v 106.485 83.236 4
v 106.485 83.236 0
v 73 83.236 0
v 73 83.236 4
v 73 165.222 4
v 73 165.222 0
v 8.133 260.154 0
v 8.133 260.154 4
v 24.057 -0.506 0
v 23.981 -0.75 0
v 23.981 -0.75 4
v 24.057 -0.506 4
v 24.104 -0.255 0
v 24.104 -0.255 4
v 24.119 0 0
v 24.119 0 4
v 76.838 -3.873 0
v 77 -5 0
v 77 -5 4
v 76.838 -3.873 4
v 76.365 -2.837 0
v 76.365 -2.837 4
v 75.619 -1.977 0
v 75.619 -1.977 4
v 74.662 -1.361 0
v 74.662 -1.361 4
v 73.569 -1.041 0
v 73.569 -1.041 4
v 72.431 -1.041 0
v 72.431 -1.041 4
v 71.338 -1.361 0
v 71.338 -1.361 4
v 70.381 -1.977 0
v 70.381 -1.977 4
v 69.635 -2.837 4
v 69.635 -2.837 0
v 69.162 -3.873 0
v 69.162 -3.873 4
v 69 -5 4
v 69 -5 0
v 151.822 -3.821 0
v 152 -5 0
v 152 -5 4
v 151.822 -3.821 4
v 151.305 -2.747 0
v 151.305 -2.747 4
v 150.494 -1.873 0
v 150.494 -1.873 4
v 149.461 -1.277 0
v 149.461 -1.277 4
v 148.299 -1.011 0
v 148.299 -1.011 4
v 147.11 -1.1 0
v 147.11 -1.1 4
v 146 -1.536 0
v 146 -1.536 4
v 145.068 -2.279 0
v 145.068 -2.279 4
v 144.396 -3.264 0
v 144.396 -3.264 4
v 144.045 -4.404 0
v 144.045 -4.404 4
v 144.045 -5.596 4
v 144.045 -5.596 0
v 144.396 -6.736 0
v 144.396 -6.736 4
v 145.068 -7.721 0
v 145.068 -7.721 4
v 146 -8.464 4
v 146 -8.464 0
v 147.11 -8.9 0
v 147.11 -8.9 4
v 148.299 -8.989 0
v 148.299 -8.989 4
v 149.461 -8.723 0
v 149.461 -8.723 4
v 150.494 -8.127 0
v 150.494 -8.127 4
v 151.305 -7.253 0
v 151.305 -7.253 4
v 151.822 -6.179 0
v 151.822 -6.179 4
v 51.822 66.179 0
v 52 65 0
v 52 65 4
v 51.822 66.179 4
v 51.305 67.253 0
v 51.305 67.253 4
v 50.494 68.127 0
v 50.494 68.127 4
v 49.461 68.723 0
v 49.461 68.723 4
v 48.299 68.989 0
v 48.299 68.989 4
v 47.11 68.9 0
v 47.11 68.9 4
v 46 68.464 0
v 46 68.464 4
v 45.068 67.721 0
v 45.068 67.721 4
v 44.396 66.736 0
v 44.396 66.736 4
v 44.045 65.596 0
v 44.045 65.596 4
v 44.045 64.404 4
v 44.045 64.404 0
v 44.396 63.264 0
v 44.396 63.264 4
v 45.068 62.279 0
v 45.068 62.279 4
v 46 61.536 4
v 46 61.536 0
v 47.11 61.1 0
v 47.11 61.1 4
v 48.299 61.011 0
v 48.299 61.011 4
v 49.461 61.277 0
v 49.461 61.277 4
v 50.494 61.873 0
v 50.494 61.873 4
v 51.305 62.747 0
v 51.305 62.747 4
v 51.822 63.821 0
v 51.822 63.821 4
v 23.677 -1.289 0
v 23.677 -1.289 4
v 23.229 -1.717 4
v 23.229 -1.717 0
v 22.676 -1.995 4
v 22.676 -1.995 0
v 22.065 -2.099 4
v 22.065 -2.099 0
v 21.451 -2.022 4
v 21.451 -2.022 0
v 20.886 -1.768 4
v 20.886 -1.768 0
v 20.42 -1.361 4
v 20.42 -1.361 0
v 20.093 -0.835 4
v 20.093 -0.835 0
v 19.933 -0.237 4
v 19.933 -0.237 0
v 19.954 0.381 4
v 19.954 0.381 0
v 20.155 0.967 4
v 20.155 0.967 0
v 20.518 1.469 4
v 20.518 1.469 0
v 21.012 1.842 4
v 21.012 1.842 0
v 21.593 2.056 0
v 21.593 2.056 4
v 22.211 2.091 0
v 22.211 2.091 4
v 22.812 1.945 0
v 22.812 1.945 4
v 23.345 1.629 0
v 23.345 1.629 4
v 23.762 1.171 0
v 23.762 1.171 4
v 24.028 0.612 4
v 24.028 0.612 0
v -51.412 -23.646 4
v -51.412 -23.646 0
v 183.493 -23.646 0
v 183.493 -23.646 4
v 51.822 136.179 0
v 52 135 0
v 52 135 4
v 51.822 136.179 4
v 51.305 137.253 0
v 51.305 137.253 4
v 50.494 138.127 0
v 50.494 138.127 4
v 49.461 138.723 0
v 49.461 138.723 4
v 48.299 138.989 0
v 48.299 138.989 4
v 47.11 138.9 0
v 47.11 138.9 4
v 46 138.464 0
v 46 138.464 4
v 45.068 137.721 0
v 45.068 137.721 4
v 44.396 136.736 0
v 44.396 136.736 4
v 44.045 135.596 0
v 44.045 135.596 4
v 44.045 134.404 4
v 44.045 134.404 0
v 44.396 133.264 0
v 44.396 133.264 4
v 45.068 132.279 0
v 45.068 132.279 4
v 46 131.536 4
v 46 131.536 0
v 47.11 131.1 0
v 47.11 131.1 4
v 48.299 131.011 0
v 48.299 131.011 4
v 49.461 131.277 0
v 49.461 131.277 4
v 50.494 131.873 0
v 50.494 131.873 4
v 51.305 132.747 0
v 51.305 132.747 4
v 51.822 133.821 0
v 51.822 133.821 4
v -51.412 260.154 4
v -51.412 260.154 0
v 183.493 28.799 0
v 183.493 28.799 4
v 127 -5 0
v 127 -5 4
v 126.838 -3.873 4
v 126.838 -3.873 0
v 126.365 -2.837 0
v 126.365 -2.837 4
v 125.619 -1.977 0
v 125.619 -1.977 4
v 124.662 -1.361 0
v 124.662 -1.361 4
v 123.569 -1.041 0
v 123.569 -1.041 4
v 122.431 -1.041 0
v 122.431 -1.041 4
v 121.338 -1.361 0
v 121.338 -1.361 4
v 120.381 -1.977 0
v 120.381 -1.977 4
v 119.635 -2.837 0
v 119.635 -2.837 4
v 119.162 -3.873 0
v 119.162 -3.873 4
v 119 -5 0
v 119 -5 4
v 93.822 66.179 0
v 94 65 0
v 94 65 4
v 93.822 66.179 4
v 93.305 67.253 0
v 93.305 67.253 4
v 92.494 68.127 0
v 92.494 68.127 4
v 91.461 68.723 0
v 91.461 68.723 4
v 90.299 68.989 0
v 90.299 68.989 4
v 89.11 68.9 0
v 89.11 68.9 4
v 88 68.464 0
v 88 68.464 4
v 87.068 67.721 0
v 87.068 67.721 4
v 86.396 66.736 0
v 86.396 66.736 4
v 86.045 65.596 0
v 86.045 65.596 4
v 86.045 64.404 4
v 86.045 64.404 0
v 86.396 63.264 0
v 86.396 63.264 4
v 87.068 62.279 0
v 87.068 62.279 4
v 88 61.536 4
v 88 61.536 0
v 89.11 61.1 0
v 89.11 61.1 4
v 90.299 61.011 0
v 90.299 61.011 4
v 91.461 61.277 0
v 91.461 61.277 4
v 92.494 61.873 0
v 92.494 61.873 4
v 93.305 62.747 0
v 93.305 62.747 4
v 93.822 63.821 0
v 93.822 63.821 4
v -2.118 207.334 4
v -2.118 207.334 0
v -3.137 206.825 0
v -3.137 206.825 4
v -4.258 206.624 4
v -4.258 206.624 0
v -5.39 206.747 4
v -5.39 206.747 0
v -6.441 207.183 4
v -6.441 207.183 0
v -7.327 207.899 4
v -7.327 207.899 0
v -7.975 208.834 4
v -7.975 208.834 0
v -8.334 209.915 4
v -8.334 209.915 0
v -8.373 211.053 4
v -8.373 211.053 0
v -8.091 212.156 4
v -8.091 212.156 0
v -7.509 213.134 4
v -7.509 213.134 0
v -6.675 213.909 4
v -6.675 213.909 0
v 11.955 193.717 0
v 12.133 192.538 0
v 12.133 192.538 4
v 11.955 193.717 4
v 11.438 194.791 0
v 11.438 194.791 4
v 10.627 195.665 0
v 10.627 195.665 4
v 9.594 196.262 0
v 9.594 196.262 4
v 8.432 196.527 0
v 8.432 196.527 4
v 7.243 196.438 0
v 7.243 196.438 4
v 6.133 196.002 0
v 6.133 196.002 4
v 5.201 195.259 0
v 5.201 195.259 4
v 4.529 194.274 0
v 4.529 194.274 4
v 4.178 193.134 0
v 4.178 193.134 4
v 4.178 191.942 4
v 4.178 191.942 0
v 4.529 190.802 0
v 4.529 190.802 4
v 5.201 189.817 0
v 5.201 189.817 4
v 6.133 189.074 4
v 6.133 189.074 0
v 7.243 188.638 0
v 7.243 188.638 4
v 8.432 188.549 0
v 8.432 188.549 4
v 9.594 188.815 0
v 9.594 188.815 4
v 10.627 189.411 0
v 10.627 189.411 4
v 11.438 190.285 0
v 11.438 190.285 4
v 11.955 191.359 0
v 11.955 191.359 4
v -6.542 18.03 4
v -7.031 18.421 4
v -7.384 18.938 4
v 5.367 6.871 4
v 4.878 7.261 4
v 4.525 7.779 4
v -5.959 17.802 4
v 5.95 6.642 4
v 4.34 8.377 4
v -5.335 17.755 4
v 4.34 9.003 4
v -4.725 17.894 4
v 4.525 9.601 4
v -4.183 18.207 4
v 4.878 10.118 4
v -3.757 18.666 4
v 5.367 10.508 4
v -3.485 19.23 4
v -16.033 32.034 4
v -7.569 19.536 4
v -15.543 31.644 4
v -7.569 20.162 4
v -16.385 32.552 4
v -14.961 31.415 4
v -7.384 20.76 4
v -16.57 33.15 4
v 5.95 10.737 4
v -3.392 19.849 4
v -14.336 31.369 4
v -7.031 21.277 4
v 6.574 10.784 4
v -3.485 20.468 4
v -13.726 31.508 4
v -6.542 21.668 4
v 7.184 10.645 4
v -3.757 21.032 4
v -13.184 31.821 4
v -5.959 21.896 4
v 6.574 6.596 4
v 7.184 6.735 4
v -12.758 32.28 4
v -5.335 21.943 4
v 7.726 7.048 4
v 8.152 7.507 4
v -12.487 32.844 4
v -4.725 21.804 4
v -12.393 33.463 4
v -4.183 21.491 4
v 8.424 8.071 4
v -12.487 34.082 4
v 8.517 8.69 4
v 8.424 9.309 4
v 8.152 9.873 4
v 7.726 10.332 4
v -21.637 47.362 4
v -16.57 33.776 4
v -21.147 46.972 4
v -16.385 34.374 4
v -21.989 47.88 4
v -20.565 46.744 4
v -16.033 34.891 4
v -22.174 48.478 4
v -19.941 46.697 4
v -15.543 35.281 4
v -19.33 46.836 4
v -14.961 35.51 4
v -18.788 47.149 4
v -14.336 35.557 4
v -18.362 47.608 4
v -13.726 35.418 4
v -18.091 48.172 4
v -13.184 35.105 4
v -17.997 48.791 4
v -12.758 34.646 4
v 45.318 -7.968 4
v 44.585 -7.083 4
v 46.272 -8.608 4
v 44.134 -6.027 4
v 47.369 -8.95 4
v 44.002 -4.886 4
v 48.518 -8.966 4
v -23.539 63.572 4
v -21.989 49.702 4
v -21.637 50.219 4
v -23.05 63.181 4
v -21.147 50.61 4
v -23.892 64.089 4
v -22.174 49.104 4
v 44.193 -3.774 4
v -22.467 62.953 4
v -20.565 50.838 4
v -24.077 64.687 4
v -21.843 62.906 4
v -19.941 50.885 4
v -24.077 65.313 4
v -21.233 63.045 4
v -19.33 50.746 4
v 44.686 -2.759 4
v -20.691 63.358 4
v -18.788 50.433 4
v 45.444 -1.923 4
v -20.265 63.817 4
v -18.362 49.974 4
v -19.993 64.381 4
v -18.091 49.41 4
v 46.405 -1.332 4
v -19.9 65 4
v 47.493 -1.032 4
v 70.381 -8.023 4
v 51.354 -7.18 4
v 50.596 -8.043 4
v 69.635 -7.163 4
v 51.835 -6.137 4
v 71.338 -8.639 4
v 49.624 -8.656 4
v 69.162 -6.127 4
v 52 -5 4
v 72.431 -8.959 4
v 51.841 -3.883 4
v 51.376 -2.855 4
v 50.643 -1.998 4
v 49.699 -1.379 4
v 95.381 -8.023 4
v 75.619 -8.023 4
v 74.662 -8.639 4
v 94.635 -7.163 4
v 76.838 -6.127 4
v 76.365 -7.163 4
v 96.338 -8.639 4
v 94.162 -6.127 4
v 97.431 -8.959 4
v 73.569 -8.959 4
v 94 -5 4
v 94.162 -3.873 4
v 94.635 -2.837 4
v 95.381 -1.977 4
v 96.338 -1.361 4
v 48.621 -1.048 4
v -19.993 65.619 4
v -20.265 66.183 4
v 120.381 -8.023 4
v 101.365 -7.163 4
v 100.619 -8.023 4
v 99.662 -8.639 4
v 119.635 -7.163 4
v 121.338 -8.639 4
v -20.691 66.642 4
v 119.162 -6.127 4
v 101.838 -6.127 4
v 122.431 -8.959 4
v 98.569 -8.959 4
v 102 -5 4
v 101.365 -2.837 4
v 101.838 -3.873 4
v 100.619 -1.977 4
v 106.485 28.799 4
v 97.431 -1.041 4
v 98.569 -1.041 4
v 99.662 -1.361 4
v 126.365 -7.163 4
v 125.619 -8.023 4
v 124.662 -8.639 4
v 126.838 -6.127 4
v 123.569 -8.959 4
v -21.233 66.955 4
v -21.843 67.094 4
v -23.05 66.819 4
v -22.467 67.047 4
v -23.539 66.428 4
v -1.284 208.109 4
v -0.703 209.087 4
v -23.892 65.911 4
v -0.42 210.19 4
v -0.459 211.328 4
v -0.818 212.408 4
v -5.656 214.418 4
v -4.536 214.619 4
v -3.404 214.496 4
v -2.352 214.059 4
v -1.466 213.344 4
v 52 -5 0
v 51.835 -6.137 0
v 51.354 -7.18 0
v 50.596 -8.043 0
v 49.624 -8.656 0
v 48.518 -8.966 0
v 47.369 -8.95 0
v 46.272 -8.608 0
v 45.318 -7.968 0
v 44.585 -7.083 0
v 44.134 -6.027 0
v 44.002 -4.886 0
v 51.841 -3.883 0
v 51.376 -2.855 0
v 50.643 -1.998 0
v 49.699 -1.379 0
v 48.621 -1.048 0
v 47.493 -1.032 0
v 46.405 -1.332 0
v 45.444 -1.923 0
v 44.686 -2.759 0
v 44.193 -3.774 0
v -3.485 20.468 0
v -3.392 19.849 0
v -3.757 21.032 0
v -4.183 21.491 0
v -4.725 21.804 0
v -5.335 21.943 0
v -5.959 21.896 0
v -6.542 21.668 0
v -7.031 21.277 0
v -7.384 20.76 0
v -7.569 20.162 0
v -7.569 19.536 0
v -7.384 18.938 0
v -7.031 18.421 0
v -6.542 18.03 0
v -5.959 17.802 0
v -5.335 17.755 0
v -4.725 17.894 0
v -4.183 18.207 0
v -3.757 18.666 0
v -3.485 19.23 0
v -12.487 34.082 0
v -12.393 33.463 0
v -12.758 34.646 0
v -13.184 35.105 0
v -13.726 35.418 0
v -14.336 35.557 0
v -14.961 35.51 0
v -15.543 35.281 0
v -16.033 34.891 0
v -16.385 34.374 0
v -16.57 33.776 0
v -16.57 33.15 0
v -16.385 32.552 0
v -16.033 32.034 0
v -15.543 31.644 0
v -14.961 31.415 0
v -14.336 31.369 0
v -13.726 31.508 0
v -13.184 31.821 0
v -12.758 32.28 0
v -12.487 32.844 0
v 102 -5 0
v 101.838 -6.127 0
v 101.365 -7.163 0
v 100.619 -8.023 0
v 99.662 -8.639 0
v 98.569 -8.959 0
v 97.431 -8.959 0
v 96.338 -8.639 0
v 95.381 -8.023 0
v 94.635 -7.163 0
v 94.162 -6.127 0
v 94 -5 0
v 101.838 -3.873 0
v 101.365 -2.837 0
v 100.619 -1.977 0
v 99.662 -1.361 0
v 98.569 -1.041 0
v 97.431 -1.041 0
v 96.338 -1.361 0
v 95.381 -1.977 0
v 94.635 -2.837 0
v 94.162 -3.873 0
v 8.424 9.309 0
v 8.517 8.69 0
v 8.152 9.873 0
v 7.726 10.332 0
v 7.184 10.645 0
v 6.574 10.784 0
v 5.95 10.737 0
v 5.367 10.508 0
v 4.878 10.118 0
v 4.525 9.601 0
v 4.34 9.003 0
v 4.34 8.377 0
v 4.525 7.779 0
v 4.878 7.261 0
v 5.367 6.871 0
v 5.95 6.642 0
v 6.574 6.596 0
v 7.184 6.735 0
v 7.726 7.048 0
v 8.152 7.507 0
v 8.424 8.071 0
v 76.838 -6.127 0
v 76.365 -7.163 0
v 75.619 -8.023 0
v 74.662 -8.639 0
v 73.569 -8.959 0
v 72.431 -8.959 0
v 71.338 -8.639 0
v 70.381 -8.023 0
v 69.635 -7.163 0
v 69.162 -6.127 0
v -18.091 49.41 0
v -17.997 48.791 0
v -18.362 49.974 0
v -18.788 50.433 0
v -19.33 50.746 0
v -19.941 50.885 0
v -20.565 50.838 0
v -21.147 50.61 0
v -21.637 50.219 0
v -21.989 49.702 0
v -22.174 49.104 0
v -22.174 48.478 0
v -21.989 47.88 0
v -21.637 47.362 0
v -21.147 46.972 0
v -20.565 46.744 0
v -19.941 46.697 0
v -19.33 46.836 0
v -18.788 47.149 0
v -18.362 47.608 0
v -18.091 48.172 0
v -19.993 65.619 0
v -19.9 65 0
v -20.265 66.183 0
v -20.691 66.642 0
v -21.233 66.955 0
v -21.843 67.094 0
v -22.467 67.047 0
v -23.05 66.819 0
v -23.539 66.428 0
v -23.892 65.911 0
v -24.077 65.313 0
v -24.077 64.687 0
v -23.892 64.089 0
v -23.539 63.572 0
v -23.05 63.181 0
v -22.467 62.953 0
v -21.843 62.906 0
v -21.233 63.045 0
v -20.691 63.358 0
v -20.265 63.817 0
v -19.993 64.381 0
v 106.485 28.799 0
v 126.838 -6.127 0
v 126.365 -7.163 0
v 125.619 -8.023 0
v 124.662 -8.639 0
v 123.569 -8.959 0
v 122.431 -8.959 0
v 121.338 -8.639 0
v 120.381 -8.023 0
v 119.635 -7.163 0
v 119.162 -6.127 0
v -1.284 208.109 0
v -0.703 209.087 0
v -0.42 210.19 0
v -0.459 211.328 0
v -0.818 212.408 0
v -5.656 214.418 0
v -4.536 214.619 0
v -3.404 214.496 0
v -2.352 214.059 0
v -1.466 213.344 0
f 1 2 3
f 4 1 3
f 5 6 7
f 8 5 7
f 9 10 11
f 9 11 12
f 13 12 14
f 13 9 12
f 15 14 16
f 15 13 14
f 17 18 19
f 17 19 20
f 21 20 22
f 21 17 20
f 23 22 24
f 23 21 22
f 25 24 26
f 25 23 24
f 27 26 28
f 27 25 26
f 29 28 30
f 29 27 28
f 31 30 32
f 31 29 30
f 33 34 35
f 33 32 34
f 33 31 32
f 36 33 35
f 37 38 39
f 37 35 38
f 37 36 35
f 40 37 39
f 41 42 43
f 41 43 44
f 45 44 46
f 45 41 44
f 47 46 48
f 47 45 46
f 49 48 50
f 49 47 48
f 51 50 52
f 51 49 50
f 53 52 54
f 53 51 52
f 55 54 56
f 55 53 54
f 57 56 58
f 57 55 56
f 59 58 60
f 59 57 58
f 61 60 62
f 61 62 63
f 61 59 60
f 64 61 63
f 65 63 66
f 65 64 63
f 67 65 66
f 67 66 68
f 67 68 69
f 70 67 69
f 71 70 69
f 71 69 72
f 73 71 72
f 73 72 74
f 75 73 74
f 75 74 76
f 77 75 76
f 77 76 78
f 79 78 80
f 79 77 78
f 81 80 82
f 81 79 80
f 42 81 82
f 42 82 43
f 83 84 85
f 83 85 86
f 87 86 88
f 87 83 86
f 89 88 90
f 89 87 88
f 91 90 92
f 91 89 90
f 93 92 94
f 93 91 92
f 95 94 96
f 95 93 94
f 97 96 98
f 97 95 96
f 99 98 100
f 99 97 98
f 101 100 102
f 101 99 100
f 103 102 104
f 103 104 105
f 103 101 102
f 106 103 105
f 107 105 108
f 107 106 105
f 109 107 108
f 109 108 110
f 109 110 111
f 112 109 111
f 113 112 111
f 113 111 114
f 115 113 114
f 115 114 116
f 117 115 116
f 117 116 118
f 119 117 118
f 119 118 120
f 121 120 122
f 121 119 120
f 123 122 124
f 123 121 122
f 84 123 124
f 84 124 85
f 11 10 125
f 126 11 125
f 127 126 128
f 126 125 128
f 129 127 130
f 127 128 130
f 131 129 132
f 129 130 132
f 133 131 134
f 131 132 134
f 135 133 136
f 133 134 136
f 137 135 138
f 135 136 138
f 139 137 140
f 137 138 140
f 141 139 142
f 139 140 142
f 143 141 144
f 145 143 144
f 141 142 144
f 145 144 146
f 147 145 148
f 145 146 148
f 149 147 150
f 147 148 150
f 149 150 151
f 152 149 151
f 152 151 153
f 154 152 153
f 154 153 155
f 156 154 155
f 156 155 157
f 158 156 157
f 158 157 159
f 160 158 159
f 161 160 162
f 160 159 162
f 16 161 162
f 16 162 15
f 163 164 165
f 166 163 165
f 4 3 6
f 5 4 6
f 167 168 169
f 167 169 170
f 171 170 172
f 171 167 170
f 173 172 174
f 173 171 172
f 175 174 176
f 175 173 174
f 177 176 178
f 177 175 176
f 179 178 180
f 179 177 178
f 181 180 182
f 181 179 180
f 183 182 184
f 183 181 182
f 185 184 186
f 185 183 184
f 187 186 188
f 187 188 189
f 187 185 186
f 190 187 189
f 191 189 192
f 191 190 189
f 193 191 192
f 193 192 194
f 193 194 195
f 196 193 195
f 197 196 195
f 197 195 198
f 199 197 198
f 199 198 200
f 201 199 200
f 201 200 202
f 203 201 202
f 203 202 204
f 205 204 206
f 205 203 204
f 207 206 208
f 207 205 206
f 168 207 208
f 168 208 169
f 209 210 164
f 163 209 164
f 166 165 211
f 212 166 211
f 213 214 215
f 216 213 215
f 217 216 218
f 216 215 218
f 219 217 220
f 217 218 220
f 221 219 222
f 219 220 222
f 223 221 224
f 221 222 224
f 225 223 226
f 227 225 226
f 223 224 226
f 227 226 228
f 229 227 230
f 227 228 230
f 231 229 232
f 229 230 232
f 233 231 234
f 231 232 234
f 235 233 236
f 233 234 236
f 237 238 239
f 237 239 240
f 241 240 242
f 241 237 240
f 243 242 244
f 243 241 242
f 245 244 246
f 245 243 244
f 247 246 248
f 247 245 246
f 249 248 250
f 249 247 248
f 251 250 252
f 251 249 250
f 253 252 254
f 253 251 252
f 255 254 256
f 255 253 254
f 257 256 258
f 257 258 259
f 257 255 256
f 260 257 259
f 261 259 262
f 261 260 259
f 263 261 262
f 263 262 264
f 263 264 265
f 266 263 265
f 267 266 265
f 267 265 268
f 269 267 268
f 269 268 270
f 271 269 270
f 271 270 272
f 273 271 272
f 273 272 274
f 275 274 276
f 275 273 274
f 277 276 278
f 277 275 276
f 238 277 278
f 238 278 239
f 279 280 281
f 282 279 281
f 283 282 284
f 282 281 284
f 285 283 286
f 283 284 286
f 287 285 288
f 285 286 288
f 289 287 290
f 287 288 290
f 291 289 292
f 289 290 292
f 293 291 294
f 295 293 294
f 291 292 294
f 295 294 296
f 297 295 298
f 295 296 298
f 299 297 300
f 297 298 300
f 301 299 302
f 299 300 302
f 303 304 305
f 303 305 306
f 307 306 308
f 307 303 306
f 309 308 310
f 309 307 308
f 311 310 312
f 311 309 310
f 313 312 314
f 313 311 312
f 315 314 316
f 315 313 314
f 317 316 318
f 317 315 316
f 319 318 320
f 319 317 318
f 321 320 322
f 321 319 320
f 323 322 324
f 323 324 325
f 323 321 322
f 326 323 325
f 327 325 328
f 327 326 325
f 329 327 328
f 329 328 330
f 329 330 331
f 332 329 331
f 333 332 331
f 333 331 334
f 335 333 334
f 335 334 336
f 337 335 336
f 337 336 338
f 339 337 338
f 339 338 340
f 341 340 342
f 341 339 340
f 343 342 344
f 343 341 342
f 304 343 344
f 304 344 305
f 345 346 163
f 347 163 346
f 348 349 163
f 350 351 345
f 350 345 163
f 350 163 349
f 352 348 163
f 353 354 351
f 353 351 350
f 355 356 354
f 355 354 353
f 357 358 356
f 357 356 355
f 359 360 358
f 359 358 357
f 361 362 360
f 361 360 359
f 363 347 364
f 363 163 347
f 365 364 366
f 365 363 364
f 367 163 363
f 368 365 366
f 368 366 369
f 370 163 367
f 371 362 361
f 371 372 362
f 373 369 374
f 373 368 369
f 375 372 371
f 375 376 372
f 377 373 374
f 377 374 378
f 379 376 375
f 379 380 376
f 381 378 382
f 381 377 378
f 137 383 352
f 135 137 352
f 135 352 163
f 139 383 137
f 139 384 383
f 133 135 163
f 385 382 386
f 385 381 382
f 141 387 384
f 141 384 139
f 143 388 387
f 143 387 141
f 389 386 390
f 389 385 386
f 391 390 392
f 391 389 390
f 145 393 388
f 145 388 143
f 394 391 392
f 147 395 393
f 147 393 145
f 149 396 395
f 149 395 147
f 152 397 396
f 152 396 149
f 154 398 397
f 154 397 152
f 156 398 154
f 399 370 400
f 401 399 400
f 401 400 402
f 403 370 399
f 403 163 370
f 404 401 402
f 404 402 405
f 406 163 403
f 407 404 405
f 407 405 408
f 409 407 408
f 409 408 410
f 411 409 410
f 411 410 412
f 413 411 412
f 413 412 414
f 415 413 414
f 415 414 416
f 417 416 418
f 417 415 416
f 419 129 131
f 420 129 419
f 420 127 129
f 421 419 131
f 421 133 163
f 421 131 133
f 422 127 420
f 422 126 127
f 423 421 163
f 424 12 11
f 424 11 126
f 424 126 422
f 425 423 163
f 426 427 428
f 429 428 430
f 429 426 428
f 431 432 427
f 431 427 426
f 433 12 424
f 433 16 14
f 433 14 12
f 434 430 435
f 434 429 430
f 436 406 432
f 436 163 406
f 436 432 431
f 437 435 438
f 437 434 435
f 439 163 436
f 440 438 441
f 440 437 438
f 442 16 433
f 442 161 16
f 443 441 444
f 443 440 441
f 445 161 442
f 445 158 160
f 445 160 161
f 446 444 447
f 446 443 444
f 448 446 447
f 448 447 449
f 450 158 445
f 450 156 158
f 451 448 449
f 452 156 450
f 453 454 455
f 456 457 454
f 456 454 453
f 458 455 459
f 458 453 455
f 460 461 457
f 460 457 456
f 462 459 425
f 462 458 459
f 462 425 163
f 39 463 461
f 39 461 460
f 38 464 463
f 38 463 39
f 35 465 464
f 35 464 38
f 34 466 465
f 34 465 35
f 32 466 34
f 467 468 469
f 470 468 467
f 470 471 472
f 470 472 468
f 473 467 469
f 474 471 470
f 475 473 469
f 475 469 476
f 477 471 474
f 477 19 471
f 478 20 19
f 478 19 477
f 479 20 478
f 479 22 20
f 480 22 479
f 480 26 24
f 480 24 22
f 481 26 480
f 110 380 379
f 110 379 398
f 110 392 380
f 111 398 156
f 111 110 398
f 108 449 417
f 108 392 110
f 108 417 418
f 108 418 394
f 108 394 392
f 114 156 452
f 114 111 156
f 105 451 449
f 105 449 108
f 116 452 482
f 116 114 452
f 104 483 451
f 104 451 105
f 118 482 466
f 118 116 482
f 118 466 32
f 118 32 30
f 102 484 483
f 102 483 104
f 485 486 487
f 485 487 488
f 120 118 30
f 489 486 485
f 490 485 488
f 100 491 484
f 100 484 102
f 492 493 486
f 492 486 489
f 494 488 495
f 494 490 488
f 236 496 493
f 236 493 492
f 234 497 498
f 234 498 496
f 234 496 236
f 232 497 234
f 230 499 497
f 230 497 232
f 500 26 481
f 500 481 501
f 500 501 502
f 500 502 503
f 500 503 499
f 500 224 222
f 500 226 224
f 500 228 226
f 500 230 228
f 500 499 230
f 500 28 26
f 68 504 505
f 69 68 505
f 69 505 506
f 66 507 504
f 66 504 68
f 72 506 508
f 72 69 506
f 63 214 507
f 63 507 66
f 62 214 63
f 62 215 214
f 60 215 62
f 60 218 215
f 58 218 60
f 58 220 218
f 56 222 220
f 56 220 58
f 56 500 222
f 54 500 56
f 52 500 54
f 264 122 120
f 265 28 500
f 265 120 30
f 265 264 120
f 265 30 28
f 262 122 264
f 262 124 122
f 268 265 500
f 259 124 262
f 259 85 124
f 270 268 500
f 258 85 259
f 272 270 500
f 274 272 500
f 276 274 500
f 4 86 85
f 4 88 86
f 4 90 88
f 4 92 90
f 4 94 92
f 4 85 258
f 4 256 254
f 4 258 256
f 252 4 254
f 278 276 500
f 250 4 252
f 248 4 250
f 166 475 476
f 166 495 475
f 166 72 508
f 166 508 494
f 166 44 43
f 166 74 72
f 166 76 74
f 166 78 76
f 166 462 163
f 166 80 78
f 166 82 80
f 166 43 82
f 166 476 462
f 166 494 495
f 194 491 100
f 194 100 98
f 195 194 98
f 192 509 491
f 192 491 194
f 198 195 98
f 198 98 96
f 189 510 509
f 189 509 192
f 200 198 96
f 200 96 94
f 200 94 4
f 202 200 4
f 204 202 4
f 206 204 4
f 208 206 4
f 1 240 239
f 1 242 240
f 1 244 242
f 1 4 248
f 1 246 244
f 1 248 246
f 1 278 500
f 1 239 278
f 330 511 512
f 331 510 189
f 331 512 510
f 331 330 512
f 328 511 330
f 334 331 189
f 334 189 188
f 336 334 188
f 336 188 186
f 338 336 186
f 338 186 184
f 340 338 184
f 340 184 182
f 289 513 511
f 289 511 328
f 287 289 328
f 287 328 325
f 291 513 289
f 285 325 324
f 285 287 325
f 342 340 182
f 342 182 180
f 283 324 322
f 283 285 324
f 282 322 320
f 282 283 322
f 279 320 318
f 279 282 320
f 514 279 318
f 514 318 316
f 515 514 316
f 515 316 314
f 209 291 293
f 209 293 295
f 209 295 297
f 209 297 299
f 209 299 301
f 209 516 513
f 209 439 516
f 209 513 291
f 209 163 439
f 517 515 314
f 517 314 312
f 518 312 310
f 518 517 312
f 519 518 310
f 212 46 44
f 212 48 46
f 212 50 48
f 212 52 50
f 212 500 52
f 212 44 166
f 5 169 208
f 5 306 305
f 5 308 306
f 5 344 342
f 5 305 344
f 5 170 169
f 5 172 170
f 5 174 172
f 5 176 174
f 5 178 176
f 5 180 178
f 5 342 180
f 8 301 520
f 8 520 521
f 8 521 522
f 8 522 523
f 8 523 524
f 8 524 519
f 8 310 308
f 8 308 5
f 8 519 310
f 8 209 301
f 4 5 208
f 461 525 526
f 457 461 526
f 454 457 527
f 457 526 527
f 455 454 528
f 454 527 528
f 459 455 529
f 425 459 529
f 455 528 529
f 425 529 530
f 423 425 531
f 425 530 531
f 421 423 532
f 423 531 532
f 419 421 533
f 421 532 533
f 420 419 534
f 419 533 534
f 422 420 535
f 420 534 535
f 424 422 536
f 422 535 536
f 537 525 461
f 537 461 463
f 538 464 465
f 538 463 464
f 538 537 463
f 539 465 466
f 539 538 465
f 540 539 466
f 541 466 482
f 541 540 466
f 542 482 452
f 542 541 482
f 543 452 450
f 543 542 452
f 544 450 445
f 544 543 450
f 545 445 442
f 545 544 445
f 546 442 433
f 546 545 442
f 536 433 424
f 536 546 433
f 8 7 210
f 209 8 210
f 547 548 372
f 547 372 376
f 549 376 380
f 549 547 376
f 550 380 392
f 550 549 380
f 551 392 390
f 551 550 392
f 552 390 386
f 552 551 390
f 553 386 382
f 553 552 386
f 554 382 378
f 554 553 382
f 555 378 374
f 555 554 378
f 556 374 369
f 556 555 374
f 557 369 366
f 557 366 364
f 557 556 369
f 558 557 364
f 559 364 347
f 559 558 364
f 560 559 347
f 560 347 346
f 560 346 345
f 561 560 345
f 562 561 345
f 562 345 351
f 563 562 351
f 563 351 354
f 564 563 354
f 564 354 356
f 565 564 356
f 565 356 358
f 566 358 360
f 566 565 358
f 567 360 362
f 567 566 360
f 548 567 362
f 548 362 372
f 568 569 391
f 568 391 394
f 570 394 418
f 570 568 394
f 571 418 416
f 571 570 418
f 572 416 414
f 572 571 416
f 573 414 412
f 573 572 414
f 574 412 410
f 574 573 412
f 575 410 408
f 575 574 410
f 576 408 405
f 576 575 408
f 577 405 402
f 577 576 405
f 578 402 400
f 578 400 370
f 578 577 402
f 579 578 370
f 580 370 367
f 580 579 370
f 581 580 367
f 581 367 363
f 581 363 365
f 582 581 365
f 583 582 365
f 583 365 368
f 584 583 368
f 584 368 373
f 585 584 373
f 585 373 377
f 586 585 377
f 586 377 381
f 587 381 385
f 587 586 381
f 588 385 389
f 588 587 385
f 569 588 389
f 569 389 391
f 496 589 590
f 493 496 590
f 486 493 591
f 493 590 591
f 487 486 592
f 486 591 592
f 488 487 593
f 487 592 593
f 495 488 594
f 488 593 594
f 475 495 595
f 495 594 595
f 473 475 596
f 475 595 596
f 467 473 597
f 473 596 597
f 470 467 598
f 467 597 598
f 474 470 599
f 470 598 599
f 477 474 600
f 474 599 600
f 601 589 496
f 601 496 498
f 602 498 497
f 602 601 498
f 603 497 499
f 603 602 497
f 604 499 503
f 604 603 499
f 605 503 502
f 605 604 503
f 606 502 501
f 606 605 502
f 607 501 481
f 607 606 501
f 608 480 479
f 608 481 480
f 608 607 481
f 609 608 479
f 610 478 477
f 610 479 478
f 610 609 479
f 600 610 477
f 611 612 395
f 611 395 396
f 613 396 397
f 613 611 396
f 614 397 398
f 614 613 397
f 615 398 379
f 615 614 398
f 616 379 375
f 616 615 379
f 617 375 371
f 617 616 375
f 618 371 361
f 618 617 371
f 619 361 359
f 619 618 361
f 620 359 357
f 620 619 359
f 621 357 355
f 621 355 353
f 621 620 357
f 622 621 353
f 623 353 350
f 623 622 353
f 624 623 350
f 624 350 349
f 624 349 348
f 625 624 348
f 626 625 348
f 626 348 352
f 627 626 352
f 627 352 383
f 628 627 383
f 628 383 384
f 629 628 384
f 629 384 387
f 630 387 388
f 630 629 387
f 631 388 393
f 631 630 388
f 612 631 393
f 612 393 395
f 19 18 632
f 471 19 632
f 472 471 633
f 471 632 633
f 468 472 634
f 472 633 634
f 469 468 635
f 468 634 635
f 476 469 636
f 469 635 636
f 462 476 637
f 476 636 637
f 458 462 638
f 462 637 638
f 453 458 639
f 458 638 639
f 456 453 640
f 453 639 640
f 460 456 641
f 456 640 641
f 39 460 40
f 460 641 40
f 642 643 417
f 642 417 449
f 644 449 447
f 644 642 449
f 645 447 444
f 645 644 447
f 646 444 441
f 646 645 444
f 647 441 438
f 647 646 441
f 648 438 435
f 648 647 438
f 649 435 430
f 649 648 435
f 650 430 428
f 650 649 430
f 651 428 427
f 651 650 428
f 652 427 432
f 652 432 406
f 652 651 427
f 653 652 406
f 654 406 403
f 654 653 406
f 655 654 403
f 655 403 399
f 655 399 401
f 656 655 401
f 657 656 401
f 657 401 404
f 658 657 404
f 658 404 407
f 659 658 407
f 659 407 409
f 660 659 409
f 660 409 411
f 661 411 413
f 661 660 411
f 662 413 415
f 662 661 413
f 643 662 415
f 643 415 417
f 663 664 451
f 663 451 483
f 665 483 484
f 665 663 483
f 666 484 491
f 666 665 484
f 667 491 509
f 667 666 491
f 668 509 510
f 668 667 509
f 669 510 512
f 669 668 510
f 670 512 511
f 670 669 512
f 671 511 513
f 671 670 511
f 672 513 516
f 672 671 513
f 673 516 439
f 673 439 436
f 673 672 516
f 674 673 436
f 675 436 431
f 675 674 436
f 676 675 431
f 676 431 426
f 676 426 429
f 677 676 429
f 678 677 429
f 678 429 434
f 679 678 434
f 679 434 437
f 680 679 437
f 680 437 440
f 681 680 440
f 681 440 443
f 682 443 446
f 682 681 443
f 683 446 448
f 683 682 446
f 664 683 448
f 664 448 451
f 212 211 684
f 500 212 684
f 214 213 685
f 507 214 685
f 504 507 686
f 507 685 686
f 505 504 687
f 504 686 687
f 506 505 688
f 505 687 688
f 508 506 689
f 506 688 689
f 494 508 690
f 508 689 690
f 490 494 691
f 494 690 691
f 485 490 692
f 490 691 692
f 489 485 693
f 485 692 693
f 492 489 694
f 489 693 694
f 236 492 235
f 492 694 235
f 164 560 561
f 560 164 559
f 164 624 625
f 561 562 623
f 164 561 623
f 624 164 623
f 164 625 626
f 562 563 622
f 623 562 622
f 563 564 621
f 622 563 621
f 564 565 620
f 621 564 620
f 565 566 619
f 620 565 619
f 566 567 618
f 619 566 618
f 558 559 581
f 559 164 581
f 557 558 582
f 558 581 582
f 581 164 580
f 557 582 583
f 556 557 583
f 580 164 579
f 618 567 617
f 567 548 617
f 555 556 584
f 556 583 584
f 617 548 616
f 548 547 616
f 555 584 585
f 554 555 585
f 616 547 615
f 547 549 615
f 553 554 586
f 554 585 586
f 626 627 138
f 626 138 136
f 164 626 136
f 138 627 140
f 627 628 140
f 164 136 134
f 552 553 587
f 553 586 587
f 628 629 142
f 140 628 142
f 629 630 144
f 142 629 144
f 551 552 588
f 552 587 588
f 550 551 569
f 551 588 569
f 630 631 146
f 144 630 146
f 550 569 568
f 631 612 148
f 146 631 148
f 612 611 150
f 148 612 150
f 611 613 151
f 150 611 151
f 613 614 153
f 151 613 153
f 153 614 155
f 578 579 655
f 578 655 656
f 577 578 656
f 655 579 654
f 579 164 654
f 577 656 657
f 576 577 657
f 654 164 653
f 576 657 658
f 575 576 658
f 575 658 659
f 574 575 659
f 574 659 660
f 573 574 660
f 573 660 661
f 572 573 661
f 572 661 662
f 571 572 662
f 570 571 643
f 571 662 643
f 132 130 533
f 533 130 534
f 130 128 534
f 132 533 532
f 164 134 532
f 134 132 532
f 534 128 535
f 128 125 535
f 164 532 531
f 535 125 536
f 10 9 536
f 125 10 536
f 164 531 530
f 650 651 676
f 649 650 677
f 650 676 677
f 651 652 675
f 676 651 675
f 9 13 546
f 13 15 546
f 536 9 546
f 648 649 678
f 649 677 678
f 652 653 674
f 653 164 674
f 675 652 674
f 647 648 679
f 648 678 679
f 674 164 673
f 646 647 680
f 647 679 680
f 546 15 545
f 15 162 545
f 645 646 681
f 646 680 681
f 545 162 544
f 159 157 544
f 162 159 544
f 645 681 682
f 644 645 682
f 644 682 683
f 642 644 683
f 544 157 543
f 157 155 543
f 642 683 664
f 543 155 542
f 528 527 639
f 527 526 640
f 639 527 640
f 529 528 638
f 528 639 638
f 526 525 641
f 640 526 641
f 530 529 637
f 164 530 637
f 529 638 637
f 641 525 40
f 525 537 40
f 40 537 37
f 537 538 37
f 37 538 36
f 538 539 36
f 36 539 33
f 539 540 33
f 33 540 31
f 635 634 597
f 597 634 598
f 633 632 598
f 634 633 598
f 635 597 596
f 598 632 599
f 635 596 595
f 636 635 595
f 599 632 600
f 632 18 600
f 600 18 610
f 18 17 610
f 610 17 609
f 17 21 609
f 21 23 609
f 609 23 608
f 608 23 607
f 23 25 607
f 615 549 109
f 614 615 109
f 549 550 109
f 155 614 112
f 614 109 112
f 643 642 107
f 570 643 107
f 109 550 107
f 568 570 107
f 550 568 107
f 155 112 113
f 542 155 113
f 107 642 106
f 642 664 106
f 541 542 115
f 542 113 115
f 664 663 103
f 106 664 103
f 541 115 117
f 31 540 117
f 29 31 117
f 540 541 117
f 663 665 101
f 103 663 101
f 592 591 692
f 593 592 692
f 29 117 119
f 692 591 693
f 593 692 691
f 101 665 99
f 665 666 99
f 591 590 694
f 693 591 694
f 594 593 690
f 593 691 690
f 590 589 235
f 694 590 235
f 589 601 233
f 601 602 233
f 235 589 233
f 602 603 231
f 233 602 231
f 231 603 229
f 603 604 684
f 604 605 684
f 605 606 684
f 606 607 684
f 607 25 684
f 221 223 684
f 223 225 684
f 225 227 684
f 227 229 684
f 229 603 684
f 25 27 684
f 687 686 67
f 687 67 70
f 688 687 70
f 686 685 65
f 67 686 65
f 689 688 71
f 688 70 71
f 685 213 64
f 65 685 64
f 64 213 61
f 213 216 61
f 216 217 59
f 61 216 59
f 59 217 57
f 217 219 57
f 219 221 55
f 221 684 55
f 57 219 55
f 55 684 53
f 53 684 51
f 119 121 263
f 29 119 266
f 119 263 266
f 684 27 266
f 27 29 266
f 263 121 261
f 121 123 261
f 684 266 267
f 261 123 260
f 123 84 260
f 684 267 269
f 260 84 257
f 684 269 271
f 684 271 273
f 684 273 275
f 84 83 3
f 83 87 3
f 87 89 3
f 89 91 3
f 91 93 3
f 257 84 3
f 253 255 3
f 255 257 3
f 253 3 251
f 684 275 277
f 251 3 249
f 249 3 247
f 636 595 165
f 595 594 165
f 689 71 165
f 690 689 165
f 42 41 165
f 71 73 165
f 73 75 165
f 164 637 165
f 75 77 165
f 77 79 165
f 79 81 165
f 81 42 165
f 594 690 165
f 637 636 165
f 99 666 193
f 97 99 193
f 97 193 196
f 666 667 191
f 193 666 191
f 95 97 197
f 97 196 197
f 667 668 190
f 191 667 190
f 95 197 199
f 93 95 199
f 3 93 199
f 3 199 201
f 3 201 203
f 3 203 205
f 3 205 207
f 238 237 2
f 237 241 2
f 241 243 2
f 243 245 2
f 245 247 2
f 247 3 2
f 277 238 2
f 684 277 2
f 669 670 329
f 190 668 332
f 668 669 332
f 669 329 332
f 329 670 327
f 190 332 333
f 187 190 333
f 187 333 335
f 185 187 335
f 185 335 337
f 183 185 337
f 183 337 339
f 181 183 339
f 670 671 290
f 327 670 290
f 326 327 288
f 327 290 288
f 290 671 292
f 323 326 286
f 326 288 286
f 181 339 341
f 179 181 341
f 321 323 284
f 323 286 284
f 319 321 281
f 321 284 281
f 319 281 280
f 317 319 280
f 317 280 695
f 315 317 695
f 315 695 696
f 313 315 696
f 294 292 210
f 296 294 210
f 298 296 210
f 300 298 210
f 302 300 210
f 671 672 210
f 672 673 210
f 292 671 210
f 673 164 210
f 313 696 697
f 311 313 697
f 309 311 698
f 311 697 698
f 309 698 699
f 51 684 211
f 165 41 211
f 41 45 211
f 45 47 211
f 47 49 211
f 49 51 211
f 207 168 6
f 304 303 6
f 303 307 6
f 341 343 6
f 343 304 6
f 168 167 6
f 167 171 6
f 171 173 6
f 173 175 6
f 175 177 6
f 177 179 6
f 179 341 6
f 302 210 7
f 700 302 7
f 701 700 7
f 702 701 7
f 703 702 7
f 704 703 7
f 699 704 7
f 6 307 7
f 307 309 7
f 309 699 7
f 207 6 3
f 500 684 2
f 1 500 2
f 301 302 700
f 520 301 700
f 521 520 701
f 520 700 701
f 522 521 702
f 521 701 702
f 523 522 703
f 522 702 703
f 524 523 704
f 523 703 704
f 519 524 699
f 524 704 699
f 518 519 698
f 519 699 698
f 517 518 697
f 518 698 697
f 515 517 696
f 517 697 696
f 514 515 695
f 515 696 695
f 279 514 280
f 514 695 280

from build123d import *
from build123d.topology import SkipClean

# Parameters (mm, degrees)
SKETCH_2_R          = 2.1
SKETCH_2_R_2        = 4
EXTRUDE_2_DEPTH     = 4
SKETCH_2_4_R        = 2.1
SKETCH_2_4_R_2      = 4
CUT_EXTRUDE_1_DEPTH = 15


with BuildPart() as part:
    # 草图2 → 凸台-拉伸2 (new body)
    with BuildSketch(Plane.XY):
        Polygon((-51.411814067, -23.645961981), (183.493005706, -23.645961981), (183.493005706, 28.798986499), (106.485233254, 28.798986499), (106.485233254, 83.235515302), (73, 83.235515302), (73, 165.222238559), (8.133015227, 260.154233909), (-51.411814067, 260.154233909), align=None)
        with Locations((6.416988046, 8.689671313)):
            Circle(SKETCH_2_R, mode=Mode.SUBTRACT)
        with Locations((-5.491997211, 19.849072718)):
            Circle(SKETCH_2_R, mode=Mode.SUBTRACT)
        with Locations((-14.493242982, 33.462806377)):
            Circle(SKETCH_2_R, mode=Mode.SUBTRACT)
        with BuildLine():
            Line((24.119237886, 0), (22.019237886, 0))
            ThreePointArc((22.019237886, 0), (22.997160887, -0.38239852), (23.980709842, -0.750085173))
            ThreePointArc((23.980709842, -0.750085173), (19.954160272, 0.381384906), (24.119237886, 0))
        make_face(mode=Mode.SUBTRACT)
        with BuildLine():
            ThreePointArc((52, -5), (47.94285131, -8.999591733), (44.001632986, -4.885714286))
            ThreePointArc((44.001632986, -4.885714286), (46, -4.971422738), (48, -5))
            Line((48, -5), (52, -5))
        make_face(mode=Mode.SUBTRACT)
        with Locations((-22, 65)):
            Circle(SKETCH_2_R, mode=Mode.SUBTRACT)
        with Locations((-20.097455932, 48.790851483)):
            Circle(SKETCH_2_R, mode=Mode.SUBTRACT)
        with Locations((48, 65)):
            Circle(SKETCH_2_R_2, mode=Mode.SUBTRACT)
        with BuildLine():
            ThreePointArc((77, -5), (73, -9), (69, -5))
            Line((69, -5), (77, -5))
        make_face(mode=Mode.SUBTRACT)
        with BuildLine():
            ThreePointArc((102, -5), (98, -9), (94, -5))
            Line((94, -5), (102, -5))
        make_face(mode=Mode.SUBTRACT)
        with BuildLine():
            ThreePointArc((127, -5), (123, -9), (119, -5))
            Line((119, -5), (127, -5))
        make_face(mode=Mode.SUBTRACT)
        with Locations((148, -5)):
            Circle(SKETCH_2_R_2, mode=Mode.SUBTRACT)
        with Locations((90, 65)):
            Circle(SKETCH_2_R_2, mode=Mode.SUBTRACT)
        with Locations((48, 135)):
            Circle(SKETCH_2_R_2, mode=Mode.SUBTRACT)
        with BuildLine():
            ThreePointArc((-2.118495143, 207.333508449), (-7.684495307, 208.343281781), (-6.674721974, 213.909281945))
            ThreePointArc((-6.674721974, 213.909281945), (-1.108721811, 212.899508613), (-2.118495143, 207.333508449))
        make_face(mode=Mode.SUBTRACT)
        with Locations((8.133015227, 192.538018085)):
            Circle(SKETCH_2_R_2, mode=Mode.SUBTRACT)
    extrude(amount=EXTRUDE_2_DEPTH)

    # 草图2<4> → 切除-拉伸1 (cut, symmetric)
    with SkipClean():  # the faces are left unmerged after this step: merging them gives an invalid solid
        with BuildSketch(Plane.XY):
            with Locations((6.416988046, 8.689671313)):
                Circle(SKETCH_2_4_R)
            with Locations((-22, 65)):
                Circle(SKETCH_2_4_R)
            with Locations((-14.493242982, 33.462806377)):
                Circle(SKETCH_2_4_R)
            with Locations((22.019237886, 0)):
                Circle(SKETCH_2_4_R)
            with Locations((-20.097455932, 48.790851483)):
                Circle(SKETCH_2_4_R)
            with Locations((-5.491997211, 19.849072718)):
                Circle(SKETCH_2_4_R)
            with Locations((48, -5)):
                Circle(SKETCH_2_4_R_2)
            with Locations((148, -5)):
                Circle(SKETCH_2_4_R_2)
            with Locations((98, -5)):
                Circle(SKETCH_2_4_R_2)
            with Locations((73, -5)):
                Circle(SKETCH_2_4_R_2)
            with Locations((123, -5)):
                Circle(SKETCH_2_4_R_2)
        extrude(amount=CUT_EXTRUDE_1_DEPTH, both=True, mode=Mode.SUBTRACT)


solid = part.part
